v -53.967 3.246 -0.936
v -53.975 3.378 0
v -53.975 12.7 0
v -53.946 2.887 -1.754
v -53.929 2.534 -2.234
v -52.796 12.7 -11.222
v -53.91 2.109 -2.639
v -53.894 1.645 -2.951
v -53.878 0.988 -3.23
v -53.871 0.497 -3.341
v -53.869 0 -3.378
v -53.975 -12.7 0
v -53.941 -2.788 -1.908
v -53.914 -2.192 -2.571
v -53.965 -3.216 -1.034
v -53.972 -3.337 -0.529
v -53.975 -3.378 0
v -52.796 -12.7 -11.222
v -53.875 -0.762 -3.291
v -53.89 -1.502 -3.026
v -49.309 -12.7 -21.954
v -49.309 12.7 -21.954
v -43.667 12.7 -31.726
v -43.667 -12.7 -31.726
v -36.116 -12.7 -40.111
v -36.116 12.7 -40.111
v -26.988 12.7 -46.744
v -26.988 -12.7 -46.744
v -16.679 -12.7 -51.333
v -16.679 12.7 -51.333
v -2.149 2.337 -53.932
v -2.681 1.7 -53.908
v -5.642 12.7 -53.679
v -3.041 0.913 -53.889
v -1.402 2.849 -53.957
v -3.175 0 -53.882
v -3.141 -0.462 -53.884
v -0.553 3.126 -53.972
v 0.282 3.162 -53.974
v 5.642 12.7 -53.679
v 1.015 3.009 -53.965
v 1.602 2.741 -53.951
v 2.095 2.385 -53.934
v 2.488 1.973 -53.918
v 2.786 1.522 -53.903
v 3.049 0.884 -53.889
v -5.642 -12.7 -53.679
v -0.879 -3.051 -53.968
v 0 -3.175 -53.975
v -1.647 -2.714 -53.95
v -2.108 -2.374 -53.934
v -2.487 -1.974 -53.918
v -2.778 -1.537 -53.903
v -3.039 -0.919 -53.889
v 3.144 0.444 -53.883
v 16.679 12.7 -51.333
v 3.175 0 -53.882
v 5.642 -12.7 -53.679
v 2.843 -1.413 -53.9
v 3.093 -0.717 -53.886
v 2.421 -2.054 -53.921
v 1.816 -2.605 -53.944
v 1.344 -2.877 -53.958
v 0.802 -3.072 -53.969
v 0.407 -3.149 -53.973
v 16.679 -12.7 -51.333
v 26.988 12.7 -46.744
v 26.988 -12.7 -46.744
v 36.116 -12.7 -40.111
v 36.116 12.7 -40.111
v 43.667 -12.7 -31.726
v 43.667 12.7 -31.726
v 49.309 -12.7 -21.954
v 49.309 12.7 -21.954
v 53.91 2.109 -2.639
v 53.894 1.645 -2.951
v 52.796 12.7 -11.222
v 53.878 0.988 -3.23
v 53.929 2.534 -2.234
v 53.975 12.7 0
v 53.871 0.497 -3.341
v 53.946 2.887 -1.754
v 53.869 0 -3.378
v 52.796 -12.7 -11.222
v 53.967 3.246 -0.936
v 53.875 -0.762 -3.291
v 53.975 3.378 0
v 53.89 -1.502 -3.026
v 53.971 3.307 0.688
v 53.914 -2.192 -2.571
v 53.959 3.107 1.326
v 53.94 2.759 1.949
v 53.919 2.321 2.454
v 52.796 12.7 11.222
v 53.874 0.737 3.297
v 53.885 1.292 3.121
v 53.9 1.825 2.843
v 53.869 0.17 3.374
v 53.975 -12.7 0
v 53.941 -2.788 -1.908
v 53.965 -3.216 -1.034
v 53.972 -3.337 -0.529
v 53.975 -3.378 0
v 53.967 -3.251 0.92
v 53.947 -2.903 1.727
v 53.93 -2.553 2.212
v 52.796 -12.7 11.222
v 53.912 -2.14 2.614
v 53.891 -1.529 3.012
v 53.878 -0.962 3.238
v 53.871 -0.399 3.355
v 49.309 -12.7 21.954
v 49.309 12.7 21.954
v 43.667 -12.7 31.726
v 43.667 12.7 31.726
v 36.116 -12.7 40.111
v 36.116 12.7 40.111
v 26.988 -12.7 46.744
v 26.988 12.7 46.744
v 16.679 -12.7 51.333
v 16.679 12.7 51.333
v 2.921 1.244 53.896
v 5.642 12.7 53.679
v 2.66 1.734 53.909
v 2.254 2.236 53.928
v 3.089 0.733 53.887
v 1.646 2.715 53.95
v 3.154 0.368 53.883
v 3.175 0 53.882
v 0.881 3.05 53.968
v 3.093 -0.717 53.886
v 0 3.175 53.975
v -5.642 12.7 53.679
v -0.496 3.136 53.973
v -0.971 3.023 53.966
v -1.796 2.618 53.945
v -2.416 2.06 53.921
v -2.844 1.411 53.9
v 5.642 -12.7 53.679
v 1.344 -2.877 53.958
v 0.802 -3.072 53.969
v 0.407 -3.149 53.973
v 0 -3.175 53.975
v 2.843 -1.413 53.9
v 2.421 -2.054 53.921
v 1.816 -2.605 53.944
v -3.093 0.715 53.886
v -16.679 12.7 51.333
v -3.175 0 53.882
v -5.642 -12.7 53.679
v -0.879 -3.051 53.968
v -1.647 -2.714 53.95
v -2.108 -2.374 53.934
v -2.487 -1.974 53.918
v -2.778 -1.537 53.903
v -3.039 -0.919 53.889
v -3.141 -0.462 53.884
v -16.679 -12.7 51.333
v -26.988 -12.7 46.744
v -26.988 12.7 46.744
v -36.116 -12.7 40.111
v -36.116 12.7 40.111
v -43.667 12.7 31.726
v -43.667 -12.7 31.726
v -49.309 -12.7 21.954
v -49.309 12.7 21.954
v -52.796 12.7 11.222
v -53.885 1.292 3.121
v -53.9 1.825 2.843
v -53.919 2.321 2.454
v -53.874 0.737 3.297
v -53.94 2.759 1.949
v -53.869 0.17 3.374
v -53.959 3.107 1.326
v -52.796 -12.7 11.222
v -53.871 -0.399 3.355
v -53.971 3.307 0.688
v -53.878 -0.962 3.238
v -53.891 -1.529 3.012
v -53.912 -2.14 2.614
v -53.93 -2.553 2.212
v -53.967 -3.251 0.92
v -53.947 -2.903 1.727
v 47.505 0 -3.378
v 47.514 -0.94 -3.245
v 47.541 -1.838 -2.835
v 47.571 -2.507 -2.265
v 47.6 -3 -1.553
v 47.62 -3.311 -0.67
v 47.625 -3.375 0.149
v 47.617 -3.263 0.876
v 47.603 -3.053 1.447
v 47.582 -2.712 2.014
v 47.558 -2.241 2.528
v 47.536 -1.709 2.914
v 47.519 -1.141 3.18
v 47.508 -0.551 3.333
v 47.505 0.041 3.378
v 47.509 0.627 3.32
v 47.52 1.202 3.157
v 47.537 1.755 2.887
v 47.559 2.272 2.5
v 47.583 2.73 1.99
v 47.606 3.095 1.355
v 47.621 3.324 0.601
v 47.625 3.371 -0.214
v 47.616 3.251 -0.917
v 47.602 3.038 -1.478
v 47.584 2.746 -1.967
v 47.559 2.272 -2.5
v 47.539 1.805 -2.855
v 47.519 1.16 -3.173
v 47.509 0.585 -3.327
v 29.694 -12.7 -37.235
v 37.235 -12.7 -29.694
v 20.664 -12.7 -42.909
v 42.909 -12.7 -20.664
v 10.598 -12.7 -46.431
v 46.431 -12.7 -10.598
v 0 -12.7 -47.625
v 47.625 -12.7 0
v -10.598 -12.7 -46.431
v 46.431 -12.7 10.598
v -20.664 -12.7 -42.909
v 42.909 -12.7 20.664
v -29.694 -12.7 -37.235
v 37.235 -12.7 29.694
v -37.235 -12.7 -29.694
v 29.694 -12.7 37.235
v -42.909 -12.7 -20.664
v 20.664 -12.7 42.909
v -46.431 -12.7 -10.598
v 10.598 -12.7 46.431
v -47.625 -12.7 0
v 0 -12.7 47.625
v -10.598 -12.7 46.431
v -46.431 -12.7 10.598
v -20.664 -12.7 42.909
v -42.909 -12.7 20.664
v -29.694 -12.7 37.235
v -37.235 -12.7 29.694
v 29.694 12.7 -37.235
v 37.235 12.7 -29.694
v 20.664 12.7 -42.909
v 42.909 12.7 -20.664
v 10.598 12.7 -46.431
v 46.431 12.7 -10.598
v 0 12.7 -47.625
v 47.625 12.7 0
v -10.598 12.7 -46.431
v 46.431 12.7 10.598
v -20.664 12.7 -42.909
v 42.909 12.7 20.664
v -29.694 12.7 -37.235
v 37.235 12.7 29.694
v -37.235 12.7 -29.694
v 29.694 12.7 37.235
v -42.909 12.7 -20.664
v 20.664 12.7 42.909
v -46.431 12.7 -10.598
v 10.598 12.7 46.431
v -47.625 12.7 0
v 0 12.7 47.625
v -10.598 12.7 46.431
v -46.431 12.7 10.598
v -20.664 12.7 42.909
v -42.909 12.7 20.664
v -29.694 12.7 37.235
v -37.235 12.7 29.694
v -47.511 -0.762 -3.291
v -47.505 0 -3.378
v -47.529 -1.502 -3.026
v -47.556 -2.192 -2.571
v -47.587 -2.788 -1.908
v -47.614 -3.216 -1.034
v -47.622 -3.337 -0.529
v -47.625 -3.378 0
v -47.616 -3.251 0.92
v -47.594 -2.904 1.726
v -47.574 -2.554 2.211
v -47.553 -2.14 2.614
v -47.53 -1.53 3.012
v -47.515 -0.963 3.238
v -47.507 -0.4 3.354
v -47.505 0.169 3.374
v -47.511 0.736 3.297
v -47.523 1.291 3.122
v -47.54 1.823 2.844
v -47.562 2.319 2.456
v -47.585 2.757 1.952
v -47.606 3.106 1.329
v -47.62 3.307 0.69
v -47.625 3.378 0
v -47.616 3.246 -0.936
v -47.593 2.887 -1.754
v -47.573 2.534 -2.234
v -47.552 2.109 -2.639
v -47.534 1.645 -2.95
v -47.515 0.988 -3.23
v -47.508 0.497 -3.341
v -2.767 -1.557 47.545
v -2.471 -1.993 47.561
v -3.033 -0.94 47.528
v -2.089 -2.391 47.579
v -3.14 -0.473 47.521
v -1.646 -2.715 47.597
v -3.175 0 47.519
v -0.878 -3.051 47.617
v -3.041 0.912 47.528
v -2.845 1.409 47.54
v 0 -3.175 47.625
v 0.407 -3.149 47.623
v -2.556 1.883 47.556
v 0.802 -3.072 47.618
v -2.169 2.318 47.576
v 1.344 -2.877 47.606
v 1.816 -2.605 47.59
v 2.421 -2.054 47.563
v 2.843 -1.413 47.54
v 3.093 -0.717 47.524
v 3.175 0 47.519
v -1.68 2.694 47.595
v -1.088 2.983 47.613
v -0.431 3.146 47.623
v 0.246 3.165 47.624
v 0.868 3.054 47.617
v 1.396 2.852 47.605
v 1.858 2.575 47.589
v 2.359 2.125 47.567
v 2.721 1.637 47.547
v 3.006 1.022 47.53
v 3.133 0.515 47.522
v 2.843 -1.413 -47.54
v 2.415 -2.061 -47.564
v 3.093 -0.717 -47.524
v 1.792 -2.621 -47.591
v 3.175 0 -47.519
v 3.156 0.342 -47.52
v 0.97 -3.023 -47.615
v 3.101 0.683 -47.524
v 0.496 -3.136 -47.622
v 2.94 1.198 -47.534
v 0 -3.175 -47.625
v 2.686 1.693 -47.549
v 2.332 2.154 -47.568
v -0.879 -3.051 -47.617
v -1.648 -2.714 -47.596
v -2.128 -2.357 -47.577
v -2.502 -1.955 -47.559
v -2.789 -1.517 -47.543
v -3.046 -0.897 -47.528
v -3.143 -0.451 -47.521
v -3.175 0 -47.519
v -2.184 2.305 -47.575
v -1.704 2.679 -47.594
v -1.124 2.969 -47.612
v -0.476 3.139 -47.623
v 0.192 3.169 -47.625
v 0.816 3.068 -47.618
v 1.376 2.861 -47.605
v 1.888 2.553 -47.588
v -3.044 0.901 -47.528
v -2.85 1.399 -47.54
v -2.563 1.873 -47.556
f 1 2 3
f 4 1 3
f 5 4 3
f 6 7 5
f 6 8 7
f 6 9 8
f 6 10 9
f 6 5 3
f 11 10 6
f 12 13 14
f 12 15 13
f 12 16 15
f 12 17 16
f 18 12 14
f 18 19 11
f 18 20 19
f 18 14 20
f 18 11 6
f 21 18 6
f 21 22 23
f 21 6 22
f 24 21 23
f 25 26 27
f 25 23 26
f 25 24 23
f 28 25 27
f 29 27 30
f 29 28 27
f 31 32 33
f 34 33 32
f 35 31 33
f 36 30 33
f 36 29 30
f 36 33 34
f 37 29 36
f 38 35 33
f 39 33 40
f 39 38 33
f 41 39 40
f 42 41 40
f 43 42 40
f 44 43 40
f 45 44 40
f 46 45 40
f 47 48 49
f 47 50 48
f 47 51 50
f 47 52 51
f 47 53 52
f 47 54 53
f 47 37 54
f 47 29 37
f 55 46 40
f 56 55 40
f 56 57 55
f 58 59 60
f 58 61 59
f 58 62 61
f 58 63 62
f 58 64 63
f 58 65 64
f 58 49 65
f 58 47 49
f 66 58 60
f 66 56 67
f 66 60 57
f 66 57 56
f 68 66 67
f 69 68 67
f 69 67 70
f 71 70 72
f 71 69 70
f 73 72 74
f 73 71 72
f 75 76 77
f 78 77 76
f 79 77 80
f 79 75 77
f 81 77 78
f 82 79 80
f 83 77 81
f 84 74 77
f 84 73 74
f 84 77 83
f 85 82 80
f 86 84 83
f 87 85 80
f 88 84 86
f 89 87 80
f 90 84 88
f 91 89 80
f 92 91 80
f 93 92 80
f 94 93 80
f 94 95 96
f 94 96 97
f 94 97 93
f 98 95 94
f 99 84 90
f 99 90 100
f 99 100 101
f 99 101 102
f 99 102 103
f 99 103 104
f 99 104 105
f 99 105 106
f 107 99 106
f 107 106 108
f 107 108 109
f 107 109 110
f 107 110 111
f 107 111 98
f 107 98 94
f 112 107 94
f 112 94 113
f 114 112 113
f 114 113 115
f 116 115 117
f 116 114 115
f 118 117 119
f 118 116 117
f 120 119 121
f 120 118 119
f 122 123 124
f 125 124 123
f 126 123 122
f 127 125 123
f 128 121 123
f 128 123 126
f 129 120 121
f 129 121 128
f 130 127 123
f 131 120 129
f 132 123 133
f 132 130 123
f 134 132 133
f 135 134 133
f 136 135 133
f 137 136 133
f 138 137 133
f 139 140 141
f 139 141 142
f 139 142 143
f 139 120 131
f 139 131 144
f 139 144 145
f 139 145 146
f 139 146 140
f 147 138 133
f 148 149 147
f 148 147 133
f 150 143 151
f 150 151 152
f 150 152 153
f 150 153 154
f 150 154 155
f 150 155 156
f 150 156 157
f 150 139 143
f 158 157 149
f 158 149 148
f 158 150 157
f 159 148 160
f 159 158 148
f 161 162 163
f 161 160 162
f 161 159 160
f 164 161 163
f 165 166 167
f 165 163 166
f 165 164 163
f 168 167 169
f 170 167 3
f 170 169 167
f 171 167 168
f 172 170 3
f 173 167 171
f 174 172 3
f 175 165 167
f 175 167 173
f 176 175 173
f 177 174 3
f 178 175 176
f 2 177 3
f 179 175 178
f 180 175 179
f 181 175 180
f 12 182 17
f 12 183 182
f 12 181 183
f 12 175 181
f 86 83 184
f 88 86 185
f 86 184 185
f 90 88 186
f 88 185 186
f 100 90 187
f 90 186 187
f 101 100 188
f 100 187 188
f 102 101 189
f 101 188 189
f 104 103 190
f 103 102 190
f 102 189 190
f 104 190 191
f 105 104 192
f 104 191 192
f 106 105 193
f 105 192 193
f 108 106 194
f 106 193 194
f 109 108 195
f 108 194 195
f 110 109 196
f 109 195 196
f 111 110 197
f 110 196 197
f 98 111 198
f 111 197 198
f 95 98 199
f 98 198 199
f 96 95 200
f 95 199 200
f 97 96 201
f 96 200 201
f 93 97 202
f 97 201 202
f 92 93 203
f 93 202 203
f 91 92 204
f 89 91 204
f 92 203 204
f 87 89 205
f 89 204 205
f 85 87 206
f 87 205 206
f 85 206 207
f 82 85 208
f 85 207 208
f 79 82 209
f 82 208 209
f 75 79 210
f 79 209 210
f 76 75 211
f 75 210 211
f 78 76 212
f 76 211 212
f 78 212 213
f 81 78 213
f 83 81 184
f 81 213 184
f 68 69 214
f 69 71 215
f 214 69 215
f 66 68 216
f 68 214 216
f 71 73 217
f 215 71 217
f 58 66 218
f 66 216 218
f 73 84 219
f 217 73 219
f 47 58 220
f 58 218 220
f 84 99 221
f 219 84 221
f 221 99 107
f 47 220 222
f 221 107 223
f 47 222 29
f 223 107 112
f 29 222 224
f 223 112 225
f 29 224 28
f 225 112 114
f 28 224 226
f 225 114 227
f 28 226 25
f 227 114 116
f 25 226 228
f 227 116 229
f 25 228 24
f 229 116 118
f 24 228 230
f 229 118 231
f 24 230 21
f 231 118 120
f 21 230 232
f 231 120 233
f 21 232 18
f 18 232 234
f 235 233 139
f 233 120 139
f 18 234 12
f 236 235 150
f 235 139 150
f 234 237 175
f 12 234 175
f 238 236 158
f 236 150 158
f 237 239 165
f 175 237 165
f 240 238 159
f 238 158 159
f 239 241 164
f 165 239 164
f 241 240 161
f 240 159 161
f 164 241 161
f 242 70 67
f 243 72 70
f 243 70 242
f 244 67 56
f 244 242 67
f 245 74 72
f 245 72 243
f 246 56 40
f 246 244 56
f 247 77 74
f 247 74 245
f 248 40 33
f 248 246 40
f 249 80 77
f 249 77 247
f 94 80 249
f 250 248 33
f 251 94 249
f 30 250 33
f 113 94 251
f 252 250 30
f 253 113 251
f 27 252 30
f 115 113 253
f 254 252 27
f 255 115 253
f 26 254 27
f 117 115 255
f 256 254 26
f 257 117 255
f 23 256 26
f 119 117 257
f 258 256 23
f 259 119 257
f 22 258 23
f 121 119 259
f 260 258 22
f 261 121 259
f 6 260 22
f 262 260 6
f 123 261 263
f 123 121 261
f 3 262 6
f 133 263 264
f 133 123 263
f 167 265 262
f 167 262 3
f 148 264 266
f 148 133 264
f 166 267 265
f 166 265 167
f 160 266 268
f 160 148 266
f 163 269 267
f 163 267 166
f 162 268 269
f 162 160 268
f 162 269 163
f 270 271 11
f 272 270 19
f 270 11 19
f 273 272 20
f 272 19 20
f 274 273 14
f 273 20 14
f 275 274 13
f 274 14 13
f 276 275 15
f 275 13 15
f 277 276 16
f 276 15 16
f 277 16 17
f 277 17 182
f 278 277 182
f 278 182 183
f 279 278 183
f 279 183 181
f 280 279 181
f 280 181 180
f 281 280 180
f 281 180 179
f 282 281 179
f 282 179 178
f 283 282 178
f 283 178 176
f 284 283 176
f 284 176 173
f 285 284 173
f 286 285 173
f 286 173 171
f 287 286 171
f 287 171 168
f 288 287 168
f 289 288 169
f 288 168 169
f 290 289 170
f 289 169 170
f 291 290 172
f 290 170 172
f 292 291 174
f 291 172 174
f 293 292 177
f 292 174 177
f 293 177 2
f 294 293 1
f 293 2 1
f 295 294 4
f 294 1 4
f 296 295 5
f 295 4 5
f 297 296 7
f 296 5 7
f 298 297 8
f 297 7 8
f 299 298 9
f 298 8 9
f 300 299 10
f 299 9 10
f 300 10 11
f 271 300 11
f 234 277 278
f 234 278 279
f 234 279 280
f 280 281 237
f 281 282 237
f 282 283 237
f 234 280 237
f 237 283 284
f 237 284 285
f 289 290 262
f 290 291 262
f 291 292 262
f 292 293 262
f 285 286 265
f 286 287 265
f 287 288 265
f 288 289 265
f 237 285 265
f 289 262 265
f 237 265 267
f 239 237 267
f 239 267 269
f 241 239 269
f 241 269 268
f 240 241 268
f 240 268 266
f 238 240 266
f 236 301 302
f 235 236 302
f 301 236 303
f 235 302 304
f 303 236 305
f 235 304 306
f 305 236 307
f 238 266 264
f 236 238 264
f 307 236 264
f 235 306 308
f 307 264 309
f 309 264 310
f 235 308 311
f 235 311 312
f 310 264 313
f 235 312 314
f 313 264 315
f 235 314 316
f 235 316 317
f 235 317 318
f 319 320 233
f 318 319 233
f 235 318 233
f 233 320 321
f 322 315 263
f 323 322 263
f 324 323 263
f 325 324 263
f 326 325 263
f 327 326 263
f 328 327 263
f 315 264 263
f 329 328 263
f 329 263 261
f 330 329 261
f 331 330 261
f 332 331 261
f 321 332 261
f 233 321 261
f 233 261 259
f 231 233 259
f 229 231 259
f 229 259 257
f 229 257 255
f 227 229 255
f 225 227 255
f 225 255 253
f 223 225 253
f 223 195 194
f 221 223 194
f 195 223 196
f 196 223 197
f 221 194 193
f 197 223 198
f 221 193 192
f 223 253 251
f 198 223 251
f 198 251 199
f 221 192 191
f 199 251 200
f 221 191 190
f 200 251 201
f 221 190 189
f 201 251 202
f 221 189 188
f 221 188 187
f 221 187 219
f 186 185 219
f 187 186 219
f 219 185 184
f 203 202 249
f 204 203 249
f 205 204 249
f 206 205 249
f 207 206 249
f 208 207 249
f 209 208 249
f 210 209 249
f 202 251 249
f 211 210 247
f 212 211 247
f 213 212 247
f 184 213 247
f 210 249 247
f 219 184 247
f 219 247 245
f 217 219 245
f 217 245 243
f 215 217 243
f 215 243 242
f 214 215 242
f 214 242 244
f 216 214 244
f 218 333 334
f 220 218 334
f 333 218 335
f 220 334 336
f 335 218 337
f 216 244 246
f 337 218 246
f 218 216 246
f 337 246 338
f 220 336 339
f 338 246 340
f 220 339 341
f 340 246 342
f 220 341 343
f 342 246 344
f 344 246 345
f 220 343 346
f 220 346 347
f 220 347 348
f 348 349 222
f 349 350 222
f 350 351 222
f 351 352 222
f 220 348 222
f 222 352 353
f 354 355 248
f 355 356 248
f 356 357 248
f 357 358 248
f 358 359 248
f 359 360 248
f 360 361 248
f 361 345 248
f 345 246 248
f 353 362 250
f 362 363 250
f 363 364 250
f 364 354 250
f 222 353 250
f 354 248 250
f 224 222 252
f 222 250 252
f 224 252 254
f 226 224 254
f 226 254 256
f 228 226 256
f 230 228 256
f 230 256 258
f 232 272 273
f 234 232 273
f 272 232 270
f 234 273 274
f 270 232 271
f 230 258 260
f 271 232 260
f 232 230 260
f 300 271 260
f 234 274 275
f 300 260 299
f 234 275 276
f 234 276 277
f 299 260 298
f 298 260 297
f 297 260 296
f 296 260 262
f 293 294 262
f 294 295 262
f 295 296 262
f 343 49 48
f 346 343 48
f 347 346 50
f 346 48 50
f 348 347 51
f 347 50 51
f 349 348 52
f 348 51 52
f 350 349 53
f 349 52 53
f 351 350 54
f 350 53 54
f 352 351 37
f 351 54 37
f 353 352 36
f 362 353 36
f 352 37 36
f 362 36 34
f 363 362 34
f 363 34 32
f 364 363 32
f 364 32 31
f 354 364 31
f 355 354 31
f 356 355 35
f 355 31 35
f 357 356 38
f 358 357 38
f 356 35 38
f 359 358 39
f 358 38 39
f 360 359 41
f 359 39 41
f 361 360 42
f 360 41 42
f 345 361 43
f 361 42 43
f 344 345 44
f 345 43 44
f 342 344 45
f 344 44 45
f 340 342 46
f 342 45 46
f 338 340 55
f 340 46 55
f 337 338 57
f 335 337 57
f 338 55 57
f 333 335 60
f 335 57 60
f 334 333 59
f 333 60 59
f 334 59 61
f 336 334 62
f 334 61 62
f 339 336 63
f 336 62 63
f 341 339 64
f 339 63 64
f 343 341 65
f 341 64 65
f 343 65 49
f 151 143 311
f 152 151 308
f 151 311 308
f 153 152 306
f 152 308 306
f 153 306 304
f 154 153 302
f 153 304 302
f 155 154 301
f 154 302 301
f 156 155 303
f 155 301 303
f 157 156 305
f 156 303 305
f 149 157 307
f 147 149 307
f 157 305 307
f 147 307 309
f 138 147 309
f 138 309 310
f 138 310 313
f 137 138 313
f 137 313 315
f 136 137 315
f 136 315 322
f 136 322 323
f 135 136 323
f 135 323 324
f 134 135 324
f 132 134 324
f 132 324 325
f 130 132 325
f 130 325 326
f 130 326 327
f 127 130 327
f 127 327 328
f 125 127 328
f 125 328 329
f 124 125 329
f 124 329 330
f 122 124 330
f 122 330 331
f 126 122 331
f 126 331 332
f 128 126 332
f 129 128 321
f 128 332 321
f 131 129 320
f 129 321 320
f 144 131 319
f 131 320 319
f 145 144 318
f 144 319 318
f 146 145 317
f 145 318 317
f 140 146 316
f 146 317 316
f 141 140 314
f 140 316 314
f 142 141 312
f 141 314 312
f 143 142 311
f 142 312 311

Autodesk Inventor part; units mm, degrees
ref_plane "XZ Plane" through (0, 0, 0) normal (0, 1, 0) x (-1, 0, 0)
sketch "Sketch1" plane through (0, 0, 0) normal (0, 1, 0) x (-1, 0, 0)
  circle A0 centre (0, 0) radius 47.625
  circle A1 centre (0, 0) radius 53.975
  dimension "d0" = 95.25
  dimension "d1" = 107.95
extrude "Extrusion1" add sketch "Sketch1" along normal mid plane 25.4
ref_plane "Work Plane1" through (0, 0, 53.975) normal (0, 0, 1) x (1, 0, 0)
sketch "Sketch2" plane through (0, 0, 53.975) normal (0, 0, 1) x (1, 0, 0)
  point P0 (0, 0)
  point P1 (0, 0)
hole "Hole1" at (0, 0, 53.975) direction (0, 0, -1) diameter 6.35 end through all
ref_plane "Work Plane2" through (53.975, 0, 0) normal (1, 0, 0) x (0, 1, 0)
sketch "Sketch3" plane through (53.975, 0, 0) normal (1, 0, 0) x (0, 1, 0)
  point P0 (0, 0)
  point P1 (0, 0)
hole "Hole2" at (53.975, 0, 0) direction (-1, 0, 0) diameter 6.7564 end through all clearance for "Flat Head Machine Screw (82)" size "1/4" standard "Ansi Unified Screw Threads"
equation "\"d0\" = innerDiam"
equation "\"d1\" = outerRingDism"
equation "\"d2\" = ringHeight"
equation "\"d5\" = ringAxelDiam"
equation "\"innerDiam\" = 95.25"
equation "\"ringThickness\" = 6.35"
equation "\"ringHeight\" = 25.4"
equation "\"ringAxelDiam\" = 6.35"
equation "\"outerRingDism\" = innerDiam + 2 * ringThickness"
equation "\"outerRingRadius\" = 0.5 * outerRingDism"
equation "\"d4\" = outerRingRadius"
equation "\"d12\" = outerRingRadius"
properties part number "outerRing"
